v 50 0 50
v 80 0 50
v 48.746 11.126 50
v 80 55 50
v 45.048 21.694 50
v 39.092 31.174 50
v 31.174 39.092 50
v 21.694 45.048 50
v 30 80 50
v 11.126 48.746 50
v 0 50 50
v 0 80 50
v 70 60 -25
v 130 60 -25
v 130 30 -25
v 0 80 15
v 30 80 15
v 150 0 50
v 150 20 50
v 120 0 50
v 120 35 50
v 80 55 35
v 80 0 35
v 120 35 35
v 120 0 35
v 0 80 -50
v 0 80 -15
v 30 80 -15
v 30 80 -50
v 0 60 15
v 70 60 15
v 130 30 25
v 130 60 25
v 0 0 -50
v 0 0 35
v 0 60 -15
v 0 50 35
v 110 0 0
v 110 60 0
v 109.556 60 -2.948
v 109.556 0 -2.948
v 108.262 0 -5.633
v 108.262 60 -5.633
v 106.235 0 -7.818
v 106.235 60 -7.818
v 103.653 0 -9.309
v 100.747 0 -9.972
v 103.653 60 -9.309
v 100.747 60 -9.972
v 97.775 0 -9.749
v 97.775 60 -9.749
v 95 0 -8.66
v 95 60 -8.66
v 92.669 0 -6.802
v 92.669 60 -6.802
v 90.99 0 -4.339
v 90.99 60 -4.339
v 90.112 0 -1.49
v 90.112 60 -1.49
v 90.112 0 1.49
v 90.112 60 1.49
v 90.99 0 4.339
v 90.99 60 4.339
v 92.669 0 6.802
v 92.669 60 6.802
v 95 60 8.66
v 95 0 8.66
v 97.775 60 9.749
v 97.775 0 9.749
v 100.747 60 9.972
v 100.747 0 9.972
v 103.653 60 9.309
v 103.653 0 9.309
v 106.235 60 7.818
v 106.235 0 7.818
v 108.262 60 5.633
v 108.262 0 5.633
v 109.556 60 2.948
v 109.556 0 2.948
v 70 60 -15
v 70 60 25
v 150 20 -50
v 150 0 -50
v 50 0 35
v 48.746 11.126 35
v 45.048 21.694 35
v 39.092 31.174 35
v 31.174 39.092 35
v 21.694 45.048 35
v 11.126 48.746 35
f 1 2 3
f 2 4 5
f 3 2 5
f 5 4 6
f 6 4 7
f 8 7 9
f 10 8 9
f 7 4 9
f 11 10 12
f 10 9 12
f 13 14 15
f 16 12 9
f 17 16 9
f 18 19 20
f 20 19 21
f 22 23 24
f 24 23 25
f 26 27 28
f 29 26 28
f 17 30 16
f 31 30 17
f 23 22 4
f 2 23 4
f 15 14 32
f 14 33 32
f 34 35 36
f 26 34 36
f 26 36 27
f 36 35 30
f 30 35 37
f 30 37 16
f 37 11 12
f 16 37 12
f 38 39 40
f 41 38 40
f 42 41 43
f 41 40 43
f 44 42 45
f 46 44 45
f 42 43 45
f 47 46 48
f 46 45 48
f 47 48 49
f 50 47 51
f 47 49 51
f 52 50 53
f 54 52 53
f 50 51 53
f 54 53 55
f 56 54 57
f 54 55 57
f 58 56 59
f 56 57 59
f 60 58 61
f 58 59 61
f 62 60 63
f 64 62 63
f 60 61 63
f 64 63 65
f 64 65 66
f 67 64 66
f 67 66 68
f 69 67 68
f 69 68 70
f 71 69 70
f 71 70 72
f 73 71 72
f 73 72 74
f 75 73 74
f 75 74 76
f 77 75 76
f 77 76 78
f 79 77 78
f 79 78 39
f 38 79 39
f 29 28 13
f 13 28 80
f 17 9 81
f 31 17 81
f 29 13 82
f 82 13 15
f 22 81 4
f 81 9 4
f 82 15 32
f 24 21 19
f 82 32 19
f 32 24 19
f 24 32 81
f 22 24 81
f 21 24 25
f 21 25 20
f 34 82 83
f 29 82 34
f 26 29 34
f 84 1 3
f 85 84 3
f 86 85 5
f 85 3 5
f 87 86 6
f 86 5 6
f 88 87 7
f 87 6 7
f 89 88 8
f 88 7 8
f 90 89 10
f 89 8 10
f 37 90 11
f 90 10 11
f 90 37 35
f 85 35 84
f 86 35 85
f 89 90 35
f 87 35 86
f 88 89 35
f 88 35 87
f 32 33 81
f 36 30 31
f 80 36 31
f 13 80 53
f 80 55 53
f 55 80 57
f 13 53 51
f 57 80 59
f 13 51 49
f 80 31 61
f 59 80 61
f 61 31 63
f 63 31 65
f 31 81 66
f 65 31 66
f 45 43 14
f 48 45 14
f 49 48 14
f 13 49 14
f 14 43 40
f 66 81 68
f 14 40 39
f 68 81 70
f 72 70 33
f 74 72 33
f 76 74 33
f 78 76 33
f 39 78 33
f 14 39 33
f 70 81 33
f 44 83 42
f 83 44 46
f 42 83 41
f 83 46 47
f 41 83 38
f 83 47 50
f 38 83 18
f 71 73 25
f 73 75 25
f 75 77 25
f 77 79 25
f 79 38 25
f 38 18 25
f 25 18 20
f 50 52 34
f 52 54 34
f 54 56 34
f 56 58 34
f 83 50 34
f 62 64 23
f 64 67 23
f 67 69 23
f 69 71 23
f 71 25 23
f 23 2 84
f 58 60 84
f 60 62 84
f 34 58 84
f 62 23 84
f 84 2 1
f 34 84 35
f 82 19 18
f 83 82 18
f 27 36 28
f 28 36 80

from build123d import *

# Parameters (mm, degrees)
BOSS_EXTRUDE1_DEPTH      = 50
BOSS_EXTRUDE1_DEPTH_BACK = 50
SKETCH2_R                = 50
CUT_EXTRUDE2_DEPTH       = 15
BOSS_EXTRUDE2_DEPTH      = 25
BOSS_EXTRUDE2_DEPTH_BACK = 25
SKETCH5_W                = 104.607091917
SKETCH5_H                = 30
CUT_EXTRUDE3_DEPTH       = 25
SKETCH6_W                = 40
SKETCH6_H                = 15
CUT_EXTRUDE4_DEPTH       = 178.200451467
SKETCH7_R                = 10
CUT_EXTRUDE5_DEPTH       = 170.115345253


with BuildPart() as part:
    # Sketch1 → Boss-Extrude1 (new, two sides: drawn at the far end of the back side and taken through both)
    with BuildSketch(Plane.XY.offset(-BOSS_EXTRUDE1_DEPTH_BACK)):
        Polygon((0, 0), (0, 80), (30, 80), (150, 20), (150, 0), align=None)
    extrude(amount=BOSS_EXTRUDE1_DEPTH + BOSS_EXTRUDE1_DEPTH_BACK)

    # Sketch2 → Cut-Extrude2 (cut)
    with BuildSketch(Plane.XY.offset(50)):
        Circle(SKETCH2_R)
    extrude(amount=-CUT_EXTRUDE2_DEPTH, mode=Mode.SUBTRACT)

    # Sketch4 → Boss-Extrude2 (add, two sides: drawn at the far end of the back side and taken through both)
    with BuildSketch(Plane.XY.offset(-BOSS_EXTRUDE2_DEPTH_BACK)):
        Polygon((70, 60), (130, 60), (130, 30), align=None)
    extrude(amount=BOSS_EXTRUDE2_DEPTH + BOSS_EXTRUDE2_DEPTH_BACK)

    # Sketch5 → Cut-Extrude3 (cut)
    with BuildSketch(Plane(origin=(0, 60, 0), x_dir=(1, 0, 0), z_dir=(0, 1, 0))):
        with Locations((29.093290598, 0)):
            Rectangle(SKETCH5_W, SKETCH5_H)
    extrude(amount=CUT_EXTRUDE3_DEPTH, mode=Mode.SUBTRACT)

    # Sketch6 → Cut-Extrude4 (cut, through all)
    with BuildSketch(Plane.XZ):
        with Locations((100, 42.5)):
            Rectangle(SKETCH6_W, SKETCH6_H)
    extrude(amount=-CUT_EXTRUDE4_DEPTH, mode=Mode.SUBTRACT)

    # Sketch7 → Cut-Extrude5 (cut, through all)
    with BuildSketch(Plane(origin=(0, 60, 0), x_dir=(1, 0, 0), z_dir=(0, 1, 0))):
        with Locations((100, 0)):
            Circle(SKETCH7_R)
    extrude(amount=-CUT_EXTRUDE5_DEPTH, mode=Mode.SUBTRACT)


solid = part.part
